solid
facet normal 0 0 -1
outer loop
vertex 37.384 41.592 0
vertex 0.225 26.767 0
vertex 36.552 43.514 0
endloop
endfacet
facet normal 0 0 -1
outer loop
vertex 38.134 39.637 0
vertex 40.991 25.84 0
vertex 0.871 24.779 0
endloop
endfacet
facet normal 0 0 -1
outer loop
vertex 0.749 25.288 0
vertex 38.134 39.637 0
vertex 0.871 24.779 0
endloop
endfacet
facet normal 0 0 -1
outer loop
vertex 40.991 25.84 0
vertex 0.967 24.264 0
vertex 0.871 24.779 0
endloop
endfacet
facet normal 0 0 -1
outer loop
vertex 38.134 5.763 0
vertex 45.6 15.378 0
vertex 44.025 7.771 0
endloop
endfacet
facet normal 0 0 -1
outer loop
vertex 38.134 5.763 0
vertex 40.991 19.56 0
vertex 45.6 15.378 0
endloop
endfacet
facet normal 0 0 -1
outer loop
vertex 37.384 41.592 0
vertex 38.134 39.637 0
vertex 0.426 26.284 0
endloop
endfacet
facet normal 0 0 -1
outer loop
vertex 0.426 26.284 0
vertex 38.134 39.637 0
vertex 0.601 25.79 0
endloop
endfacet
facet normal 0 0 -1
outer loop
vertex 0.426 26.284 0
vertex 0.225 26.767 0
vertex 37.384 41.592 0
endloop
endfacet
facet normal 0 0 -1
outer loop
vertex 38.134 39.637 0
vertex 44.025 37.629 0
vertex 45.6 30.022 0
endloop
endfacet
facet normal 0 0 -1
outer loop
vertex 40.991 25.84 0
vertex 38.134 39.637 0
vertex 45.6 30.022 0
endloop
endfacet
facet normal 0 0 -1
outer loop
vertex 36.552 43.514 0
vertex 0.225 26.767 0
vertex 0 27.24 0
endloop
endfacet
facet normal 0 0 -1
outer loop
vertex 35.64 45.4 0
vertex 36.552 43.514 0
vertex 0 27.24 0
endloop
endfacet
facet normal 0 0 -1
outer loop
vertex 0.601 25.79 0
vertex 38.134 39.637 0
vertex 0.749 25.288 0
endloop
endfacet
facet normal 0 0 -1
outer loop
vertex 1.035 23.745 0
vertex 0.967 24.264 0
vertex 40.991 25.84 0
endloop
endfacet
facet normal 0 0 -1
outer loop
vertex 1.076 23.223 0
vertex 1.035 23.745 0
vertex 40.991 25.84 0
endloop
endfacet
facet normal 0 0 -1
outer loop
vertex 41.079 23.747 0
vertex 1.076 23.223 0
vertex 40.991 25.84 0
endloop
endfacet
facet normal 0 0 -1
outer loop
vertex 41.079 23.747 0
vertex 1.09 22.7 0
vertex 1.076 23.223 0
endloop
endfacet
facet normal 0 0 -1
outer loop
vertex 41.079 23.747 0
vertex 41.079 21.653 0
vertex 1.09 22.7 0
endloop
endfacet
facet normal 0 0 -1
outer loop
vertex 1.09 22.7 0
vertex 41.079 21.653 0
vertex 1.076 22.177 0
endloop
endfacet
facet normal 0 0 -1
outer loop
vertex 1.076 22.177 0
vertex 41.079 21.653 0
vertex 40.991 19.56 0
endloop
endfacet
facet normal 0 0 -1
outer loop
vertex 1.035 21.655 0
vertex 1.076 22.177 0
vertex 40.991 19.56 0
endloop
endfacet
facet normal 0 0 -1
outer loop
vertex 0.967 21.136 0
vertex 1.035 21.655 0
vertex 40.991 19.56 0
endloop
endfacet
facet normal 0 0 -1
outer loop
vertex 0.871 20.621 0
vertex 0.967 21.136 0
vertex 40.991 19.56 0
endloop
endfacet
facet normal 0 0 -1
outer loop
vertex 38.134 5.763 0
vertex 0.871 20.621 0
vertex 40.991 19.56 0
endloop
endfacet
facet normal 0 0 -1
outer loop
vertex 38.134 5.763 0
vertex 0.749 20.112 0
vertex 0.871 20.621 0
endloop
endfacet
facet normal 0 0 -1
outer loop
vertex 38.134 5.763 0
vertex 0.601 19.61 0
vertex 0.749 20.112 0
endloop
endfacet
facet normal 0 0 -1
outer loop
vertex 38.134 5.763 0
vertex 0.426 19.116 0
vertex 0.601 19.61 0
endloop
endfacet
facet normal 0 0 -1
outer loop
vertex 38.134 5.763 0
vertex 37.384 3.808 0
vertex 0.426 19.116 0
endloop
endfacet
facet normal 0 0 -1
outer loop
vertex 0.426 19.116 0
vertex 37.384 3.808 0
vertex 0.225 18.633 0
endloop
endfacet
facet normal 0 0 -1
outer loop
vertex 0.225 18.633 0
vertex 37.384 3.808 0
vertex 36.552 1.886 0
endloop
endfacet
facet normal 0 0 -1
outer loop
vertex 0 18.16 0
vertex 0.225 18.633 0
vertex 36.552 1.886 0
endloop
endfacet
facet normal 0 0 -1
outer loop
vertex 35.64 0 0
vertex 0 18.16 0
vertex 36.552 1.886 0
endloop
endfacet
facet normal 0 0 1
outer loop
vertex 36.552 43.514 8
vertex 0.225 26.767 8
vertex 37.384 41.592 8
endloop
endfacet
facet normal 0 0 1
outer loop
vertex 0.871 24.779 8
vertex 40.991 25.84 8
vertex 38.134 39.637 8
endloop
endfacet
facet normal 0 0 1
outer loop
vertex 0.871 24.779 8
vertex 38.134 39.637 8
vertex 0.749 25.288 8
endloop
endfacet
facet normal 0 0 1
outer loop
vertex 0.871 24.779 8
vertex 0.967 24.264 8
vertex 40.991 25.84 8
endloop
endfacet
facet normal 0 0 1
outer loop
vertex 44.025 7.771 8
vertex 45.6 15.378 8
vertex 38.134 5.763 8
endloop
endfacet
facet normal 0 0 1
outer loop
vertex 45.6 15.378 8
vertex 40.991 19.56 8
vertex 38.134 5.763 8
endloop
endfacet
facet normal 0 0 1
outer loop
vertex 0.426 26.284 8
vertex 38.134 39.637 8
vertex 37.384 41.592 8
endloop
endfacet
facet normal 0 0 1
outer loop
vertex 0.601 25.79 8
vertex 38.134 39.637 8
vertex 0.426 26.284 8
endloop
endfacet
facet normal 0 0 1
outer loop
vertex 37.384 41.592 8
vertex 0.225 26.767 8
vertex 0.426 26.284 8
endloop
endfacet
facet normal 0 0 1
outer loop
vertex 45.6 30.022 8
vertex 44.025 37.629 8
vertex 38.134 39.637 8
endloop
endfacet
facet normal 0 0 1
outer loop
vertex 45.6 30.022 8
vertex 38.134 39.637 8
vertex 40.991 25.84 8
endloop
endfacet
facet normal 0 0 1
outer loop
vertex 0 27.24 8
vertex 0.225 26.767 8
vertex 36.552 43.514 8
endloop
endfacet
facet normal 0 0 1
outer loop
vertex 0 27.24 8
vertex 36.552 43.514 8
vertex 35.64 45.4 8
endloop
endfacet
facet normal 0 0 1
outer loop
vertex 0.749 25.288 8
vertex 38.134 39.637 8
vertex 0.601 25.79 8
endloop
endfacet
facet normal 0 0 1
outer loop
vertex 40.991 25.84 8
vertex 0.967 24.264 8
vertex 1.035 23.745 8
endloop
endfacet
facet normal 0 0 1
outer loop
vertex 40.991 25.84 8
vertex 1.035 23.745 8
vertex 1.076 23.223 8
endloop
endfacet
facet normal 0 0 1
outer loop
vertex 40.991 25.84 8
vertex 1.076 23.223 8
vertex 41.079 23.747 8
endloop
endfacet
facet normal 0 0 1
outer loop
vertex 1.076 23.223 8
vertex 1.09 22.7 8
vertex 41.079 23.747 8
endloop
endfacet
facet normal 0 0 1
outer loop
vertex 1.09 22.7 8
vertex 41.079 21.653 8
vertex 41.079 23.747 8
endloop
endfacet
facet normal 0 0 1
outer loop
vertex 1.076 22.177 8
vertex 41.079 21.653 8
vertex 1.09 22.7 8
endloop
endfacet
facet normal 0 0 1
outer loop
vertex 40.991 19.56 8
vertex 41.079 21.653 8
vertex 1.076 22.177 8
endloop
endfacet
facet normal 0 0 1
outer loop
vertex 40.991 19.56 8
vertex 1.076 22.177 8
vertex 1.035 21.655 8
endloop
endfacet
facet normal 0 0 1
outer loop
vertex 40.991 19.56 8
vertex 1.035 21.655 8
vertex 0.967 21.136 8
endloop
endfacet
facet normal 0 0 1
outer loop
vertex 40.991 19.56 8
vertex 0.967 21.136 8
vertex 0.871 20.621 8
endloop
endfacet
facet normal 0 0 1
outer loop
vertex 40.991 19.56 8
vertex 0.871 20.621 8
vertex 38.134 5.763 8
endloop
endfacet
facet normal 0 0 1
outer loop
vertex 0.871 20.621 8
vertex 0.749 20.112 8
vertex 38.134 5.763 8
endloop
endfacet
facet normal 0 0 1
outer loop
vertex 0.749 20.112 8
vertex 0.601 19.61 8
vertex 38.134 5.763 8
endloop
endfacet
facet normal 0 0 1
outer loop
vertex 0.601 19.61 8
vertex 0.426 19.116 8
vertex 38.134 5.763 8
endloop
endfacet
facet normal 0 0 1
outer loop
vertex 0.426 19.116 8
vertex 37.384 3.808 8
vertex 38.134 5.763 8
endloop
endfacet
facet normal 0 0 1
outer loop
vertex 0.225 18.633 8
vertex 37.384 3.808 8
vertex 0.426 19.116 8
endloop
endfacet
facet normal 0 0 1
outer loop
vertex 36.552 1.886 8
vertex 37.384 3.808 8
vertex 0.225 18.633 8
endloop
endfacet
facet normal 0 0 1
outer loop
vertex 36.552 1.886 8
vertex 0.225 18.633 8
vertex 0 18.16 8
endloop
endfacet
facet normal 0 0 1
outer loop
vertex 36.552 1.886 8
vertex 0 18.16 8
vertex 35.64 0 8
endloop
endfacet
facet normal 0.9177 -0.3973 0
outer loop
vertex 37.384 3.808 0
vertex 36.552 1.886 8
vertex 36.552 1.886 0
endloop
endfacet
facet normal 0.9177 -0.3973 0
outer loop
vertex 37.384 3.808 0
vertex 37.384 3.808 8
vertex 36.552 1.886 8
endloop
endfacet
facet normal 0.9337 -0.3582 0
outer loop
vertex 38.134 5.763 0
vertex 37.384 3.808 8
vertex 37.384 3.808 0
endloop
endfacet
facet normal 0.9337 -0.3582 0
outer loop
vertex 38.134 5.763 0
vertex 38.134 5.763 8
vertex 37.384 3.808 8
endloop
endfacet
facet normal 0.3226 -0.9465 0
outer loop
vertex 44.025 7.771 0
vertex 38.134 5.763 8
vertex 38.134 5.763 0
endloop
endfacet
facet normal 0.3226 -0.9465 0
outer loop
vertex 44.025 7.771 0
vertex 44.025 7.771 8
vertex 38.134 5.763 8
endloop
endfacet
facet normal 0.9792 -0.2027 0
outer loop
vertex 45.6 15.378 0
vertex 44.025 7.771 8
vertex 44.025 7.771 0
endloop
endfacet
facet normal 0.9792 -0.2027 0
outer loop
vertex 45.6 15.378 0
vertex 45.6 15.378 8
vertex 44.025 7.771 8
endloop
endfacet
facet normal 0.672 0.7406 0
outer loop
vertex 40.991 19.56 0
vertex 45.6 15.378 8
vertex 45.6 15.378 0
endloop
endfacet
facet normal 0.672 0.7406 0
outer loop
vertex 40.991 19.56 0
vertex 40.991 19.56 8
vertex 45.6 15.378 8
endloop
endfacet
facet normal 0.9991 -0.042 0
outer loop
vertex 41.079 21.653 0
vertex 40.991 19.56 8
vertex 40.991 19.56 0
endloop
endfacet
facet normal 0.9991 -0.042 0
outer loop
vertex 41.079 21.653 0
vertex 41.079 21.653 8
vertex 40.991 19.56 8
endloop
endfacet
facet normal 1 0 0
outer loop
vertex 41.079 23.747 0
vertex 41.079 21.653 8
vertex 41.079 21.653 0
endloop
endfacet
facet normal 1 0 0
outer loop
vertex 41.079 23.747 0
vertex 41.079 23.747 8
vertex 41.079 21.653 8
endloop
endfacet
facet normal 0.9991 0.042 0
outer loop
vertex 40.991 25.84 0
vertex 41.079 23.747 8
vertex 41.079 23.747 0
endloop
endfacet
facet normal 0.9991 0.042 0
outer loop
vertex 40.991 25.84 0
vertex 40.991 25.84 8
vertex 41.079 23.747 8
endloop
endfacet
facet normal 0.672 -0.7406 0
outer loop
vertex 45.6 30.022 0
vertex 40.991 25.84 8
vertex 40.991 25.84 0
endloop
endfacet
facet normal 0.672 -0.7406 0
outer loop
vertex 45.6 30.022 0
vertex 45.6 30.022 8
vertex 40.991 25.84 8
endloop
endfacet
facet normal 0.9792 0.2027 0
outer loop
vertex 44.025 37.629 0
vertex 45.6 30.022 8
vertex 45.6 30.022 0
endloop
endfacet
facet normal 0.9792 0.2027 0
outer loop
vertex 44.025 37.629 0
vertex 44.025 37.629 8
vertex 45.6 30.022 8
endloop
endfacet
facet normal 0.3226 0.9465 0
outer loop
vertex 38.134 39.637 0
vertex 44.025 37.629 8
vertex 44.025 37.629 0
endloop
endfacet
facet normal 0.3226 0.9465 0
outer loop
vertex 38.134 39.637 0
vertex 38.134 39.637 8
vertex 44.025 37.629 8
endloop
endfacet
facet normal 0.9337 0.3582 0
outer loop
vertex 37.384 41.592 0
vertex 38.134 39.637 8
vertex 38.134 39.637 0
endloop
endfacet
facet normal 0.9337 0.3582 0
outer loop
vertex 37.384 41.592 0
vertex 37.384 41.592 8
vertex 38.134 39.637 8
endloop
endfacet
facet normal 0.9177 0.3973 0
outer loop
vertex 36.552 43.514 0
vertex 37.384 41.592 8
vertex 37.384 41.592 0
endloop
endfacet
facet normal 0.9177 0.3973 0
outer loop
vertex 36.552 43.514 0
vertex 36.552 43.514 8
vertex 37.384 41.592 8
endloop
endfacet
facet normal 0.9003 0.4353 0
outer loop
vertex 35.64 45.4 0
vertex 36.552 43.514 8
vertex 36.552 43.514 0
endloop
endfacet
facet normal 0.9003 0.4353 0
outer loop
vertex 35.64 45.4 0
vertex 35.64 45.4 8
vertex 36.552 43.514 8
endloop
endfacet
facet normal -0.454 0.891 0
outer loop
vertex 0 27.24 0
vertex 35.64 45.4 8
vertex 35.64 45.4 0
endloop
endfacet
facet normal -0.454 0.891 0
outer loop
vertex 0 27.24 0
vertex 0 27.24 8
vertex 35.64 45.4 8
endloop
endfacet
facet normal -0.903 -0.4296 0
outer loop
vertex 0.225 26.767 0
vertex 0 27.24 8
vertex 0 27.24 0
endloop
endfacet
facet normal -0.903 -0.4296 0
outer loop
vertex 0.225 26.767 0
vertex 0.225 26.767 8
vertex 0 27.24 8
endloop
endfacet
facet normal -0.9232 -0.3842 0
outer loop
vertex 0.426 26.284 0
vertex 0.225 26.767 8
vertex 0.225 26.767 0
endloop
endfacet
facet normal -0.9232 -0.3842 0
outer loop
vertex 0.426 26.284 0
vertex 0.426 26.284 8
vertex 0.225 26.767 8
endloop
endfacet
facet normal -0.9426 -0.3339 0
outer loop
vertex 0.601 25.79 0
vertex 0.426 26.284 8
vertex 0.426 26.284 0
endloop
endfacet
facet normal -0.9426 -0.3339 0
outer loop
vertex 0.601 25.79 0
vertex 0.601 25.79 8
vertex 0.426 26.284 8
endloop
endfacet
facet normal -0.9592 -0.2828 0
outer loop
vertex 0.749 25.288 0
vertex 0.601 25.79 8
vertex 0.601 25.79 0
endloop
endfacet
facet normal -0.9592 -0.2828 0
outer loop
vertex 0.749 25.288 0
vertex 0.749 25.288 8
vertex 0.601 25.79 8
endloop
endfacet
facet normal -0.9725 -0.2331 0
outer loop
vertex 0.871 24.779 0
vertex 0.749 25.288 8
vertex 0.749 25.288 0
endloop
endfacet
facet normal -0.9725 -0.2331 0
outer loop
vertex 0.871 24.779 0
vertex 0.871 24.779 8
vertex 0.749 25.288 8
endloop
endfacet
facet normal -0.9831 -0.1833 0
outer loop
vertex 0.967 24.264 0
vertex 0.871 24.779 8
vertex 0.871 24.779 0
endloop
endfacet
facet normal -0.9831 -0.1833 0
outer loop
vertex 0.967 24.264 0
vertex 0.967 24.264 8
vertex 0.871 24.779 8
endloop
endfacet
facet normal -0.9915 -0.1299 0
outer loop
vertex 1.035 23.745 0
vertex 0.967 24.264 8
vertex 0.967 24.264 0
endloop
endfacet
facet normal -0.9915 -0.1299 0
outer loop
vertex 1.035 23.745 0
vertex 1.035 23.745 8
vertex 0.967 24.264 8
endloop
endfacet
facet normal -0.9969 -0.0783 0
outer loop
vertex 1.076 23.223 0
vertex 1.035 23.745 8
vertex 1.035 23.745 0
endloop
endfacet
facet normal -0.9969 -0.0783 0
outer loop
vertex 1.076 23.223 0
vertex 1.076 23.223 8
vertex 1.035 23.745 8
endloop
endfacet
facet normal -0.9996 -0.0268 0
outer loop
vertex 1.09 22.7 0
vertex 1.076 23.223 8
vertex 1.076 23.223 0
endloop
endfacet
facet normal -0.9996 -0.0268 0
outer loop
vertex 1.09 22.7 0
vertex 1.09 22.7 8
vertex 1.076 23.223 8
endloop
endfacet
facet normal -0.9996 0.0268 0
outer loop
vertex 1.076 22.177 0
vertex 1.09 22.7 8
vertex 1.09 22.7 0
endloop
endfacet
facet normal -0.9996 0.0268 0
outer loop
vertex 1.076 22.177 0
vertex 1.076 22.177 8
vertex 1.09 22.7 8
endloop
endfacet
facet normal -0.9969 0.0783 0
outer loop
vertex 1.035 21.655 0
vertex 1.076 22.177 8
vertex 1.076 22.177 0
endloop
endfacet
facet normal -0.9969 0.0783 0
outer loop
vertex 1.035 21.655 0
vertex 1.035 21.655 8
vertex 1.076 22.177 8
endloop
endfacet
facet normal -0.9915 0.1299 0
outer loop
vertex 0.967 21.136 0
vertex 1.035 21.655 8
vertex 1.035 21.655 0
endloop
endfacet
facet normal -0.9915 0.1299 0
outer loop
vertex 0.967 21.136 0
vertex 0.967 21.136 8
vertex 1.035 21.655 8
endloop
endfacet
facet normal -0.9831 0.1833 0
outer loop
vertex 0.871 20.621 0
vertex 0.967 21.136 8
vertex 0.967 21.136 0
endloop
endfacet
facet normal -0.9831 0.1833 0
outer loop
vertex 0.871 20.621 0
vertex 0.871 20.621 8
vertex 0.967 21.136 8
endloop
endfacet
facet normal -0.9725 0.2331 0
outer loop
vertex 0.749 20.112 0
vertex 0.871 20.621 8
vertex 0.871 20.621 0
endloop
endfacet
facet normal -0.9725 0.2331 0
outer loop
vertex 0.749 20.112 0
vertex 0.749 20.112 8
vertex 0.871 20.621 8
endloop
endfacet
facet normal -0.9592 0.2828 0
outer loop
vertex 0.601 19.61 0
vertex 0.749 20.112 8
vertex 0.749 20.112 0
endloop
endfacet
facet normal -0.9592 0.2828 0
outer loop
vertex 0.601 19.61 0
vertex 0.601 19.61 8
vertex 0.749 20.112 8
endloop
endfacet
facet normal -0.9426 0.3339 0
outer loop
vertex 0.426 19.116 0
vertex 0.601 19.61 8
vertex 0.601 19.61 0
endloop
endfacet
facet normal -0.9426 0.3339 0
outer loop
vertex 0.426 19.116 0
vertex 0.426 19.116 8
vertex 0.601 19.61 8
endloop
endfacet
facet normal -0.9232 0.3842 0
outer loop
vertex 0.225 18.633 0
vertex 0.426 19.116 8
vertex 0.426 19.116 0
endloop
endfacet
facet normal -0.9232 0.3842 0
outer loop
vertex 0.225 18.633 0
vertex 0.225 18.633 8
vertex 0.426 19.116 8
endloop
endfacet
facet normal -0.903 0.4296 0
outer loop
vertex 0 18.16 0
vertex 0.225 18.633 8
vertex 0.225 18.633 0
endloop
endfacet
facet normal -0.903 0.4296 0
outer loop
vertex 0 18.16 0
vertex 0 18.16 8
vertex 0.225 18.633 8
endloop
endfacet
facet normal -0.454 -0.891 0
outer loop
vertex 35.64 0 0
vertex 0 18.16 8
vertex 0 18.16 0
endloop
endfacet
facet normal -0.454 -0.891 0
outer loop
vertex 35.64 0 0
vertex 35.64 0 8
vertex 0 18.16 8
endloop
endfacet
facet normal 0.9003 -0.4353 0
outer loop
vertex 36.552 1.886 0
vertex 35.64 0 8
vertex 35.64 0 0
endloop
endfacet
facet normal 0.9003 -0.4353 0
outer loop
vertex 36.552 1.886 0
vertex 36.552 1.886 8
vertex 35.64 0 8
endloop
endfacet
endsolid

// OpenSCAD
$fn = 32;

// ----------------------------------------------------------------------
// Gear sector: 2 teeth on 54 degrees
// ----------------------------------------------------------------------

// --- parameters (mm) ---
sector_angle = 54;        // sector angle, degrees
root_r = 50;              // root circle radius
tooth_h = 5;              // tooth height over the root circle
teeth = 2;                // number of teeth on the sector
hub_r = 10;               // hub bore radius
plate_t = 8;              // sector thickness, Z
arc_step = 3;             // sampling step of the root/hub arcs, degrees

tip_r = root_r + tooth_h;  // tip circle radius

profile = [[35.64, 0], [36.552, 1.886], [37.384, 3.808], [38.134, 5.763], [44.025, 7.771], [45.6, 15.378], [40.991, 19.56], [41.079, 21.653], [41.079, 23.747], [40.991, 25.84], [45.6, 30.022], [44.025, 37.629], [38.134, 39.637], [37.384, 41.592], [36.552, 43.514], [35.64, 45.4], [0, 27.24], [0.225, 26.767], [0.426, 26.284], [0.601, 25.79], [0.749, 25.288], [0.871, 24.779], [0.967, 24.264], [1.035, 23.745], [1.076, 23.223], [1.09, 22.7], [1.076, 22.177], [1.035, 21.655], [0.967, 21.136], [0.871, 20.621], [0.749, 20.112], [0.601, 19.61], [0.426, 19.116], [0.225, 18.633], [0, 18.16]];  // primary outline, 35 points, counter clockwise

// --- the one profile operation ---
linear_extrude(height = plate_t) polygon(points = profile);
